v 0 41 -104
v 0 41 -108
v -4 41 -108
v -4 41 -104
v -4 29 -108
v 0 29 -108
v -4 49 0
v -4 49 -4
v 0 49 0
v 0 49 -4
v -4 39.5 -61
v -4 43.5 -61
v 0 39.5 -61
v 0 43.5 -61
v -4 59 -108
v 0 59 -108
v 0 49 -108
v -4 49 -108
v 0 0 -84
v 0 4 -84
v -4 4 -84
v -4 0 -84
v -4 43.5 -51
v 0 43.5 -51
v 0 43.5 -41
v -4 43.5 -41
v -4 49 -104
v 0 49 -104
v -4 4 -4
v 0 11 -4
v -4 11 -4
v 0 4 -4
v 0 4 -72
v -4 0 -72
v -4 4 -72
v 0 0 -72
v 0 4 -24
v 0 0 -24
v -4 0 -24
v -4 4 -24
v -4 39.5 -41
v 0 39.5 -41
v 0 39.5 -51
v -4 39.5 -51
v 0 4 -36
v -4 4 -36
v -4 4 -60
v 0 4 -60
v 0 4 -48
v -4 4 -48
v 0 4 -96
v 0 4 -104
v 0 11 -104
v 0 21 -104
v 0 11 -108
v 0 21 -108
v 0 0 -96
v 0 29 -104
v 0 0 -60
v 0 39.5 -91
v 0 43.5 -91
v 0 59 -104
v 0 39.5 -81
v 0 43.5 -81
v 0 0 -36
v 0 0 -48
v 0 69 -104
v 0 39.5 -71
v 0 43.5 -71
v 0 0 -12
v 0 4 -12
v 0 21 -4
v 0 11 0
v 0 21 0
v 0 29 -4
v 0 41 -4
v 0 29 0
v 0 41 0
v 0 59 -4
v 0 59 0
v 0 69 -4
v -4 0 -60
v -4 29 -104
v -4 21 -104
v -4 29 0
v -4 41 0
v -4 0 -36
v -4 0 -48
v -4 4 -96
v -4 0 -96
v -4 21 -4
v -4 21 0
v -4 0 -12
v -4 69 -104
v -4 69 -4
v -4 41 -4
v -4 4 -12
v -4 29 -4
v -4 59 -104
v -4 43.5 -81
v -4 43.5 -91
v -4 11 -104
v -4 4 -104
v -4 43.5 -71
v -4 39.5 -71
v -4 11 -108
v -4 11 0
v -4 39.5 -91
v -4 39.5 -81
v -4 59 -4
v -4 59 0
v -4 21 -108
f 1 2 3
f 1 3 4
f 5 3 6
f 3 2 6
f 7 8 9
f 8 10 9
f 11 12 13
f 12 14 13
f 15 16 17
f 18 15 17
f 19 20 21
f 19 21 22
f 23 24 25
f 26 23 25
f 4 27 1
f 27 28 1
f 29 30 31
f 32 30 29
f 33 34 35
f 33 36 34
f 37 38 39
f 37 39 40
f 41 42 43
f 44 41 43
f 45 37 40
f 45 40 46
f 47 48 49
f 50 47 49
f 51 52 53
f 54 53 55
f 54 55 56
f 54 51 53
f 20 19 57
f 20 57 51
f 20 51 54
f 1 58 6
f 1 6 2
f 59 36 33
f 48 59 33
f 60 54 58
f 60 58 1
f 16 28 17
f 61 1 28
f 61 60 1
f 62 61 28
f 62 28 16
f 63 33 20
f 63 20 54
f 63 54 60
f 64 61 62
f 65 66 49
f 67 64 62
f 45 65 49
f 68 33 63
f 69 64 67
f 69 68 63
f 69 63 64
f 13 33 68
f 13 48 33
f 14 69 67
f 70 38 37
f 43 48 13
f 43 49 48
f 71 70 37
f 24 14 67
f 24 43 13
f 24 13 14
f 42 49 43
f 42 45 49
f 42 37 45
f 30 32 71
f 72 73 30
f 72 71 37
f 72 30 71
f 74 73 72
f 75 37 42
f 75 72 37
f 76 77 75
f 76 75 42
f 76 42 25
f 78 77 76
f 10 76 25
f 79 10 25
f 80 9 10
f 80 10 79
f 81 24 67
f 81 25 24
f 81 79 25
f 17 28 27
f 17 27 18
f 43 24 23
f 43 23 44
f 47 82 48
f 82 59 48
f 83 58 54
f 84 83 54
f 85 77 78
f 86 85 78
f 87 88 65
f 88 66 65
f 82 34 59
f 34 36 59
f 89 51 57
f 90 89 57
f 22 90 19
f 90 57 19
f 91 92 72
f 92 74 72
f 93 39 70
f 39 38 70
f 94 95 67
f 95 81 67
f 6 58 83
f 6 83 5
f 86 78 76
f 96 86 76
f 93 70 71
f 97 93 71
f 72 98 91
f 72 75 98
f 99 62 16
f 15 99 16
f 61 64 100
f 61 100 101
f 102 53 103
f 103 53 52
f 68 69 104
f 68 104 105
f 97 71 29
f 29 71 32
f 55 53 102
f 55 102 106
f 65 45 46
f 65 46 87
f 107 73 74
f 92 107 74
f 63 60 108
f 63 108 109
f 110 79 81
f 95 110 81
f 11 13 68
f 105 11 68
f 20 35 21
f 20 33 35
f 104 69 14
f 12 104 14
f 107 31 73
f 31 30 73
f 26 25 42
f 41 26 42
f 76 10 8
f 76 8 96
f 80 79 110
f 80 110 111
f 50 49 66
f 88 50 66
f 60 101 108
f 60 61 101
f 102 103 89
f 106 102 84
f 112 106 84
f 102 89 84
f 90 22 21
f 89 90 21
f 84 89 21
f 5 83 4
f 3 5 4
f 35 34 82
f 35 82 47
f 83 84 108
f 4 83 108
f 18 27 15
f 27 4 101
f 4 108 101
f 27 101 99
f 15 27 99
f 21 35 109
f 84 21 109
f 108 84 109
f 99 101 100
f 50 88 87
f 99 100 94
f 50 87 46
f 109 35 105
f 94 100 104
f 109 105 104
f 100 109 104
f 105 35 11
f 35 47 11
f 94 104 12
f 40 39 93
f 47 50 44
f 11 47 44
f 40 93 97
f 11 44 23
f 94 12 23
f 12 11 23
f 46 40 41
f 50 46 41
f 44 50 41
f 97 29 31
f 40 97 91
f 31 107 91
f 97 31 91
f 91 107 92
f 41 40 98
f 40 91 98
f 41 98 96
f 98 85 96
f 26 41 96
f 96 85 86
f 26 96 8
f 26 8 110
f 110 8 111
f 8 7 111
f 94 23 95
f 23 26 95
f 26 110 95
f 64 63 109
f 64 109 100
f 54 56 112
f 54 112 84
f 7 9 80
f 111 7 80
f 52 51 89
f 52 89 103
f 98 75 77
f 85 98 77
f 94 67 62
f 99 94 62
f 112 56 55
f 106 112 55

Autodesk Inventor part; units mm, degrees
ref_plane "YZ Plane" through (0, 0, 0) normal (1, 0, 0) x (0, 1, 0)
ref_plane "XZ Plane" through (0, 0, 0) normal (0, 1, 0) x (-1, 0, 0)
ref_plane "XY Plane" through (0, 0, 0) normal (0, 0, 1) x (1, 0, 0)
sketch "Sketch1" plane through (0, 0, 0) normal (1, 0, 0) x (0, 1, 0)
  line L0 (0, 0) -> (69, 0)
  line L1 (69, 0) -> (69, -108)
  line L2 (69, -108) -> (0, -108)
  line L3 (0, -108) -> (0, 0)
  dimension "d228" = 69
  dimension "d229" = 108
extrude "Extrusion1" add sketch "Sketch1" against normal blind 4
sketch "Sketch2" plane through (0, 0, 0) normal (1, 0, 0) x (0, 0, -1)
  line L0 (54, 69) -> (54, 0)
  line L1 (108, 0) -> (0, 0) projected
  line L2 (0, 0) -> (0, 69) projected
  line L3 (0, 34.5) -> (108, 34.5)
  line L4 (108, 69) -> (108, 0) projected
  line L5 (0, 0) -> (108, 0)
  line L6 (12, 0) -> (12, 4)
  line L7 (4, 0) -> (12, 0)
  line L8 (4, 59) -> (4, 49)
  line L9 (4, 49) -> (0, 49)
  line L10 (0, 49) -> (0, 41)
  line L11 (0, 41) -> (4, 41)
  line L12 (4, 41) -> (4, 29)
  line L13 (4, 29) -> (0, 29)
  line L14 (0, 29) -> (0, 21)
  line L15 (0, 21) -> (4, 21)
  line L16 (4, 21) -> (4, 11)
  line L17 (4, 11) -> (0, 11)
  line L18 (0, 69) -> (0, 0) projected
  line L19 (108, 0) -> (108, 69)
  line L20 (108, 34.5) -> (0, 34.5)
  line L21 (108, 49) -> (108, 41)
  line L22 (108, 29) -> (108, 21)
  line L23 (108, 69) -> (108, 0)
  line L24 (4, 59) -> (0, 59)
  line L25 (0, 0) -> (108, 0) projected
  line L26 (108, 69) -> (0, 69) projected
  line L27 (108, 0) -> (108, 69)
  line L28 (108, 34.5) -> (0, 34.5)
  line L29 (104, 59) -> (104, 49)
  line L30 (104, 49) -> (108, 49)
  line L31 (108, 49) -> (108, 41)
  line L32 (108, 41) -> (104, 41)
  line L33 (104, 41) -> (104, 29)
  line L34 (104, 29) -> (108, 29)
  line L35 (108, 29) -> (108, 21)
  line L36 (108, 21) -> (104, 21)
  line L37 (104, 21) -> (104, 11)
  line L38 (104, 11) -> (108, 11)
  line L39 (108, 69) -> (108, 0)
  line L40 (0, 34.5) -> (108, 34.5)
  line L41 (104, 59) -> (108, 59)
  line L42 (4, 49) -> (4, 41)
  line L43 (4, 29) -> (4, 21)
  line L44 (4, 59) -> (4, 69)
  line L45 (0, 69) -> (108, 69) projected
  line L46 (104, 69) -> (104, 59)
  line L47 (104, 49) -> (104, 41)
  line L48 (104, 29) -> (104, 21)
  line L49 (12, 0) -> (24, 0)
  line L50 (24, 0) -> (24, 4)
  line L51 (24, 4) -> (36, 4)
  line L52 (36, 4) -> (36, 0)
  line L53 (36, 0) -> (24, 0)
  line L54 (36, 0) -> (48, 0)
  line L55 (60, 0) -> (48, 0)
  line L56 (60, 0) -> (72, 0)
  line L57 (72, 0) -> (72, 4)
  line L58 (72, 4) -> (84, 4)
  line L59 (84, 4) -> (84, 0)
  line L60 (84, 0) -> (72, 0)
  line L61 (12, 4) -> (0, 4)
  line L62 (4, 11) -> (4, 0)
  line L63 (104, 11) -> (104, 0)
  line L64 (106, 0) -> (96, 0)
  line L65 (84, 0) -> (96, 0)
  line L66 (48, 0) -> (60, 0)
  line L67 (60, 0) -> (72, 0)
  line L68 (96, 0) -> (106, 0)
  line L69 (108, 4) -> (108, 11)
  line L70 (60, 0) -> (60, 4)
  line L71 (48, 4) -> (48, 0)
  line L72 (60, 4) -> (48, 4)
  line L73 (96, 4) -> (108, 4)
  line L74 (96, 4) -> (96, 0)
  line L75 (108, 0) -> (108, 69) projected
  line L76 (108, 4) -> (108, 0)
  point P0 (12, 0)
  point P1 (108, 29)
  point P2 (108, 41)
  point P3 (108, 49)
  point P4 (108, 59)
  point P5 (108, 11)
  point P6 (108, 21)
  point P7 (84, 0)
  point P8 (104, 0)
  point P9 (36, 0)
  point P10 (4, 4)
  point P11 (104, 4)
  dimension "d246" = 12
  dimension "d248" = 10
  dimension "d250" = 8
  dimension "d253" = 4
  dimension "d256" = 10
  dimension "d257" = 12
  dimension "d259" = 12
extrude "Extrusion2" cut sketch "Sketch2" against normal blind 4 contours L26 L4 L41 L46 | L44 L24 L2 L26 | L72 L70 L1 L0 | L0 L1 L71 L72 | L11 L2 L9 L42 | L43 L15 L2 L13 | L47 L30 L4 L32 | L34 L4 L36 L48 | L57 L58 L59 L1 | L1 L50 L51 L52 | L62 L61 L2 L17 | L38 L4 L73 L63 | L62 L1 L2 L61 | L61 L6 L1 L62 | L73 L4 L1 L63 | L63 L1 L74 L73
sketch "Sketch3" plane through (0, 0, 0) normal (1, 0, 0) x (0, 0, -1)
  line L0 (41, 39.5) -> (81, 39.5)
  line L1 (81, 39.5) -> (81, 43.5)
  line L2 (81, 43.5) -> (41, 43.5)
  line L3 (41, 43.5) -> (41, 39.5)
  line L4 (48, 4) -> (60, 4) projected
  line L5 (67, 43.5) -> (67, 39.5)
  line L6 (104, 69) -> (4, 69) projected
  line L7 (54, 69) -> (54, 4)
  line L8 (60, 4) -> (48, 4) projected
  line L9 (51, 43.5) -> (51, 39.5)
  line L10 (81, 43.5) -> (91, 43.5)
  line L11 (91, 43.5) -> (91, 39.5)
  line L12 (91, 39.5) -> (81, 39.5)
  line L13 (81, 39.5) -> (81, 43.5)
  line L14 (61, 43.5) -> (61, 39.5)
  line L15 (71, 43.5) -> (71, 39.5)
  point P0 (0, 0)
  dimension "d265" = 35.5
  dimension "d266" = 26
  dimension "d267" = 10
  dimension "d272" = 4
  dimension "d274" = 10
  dimension "d275" = 10
  dimension "d276" = 10
  dimension "d277" = 10
extrude "Extrusion3" cut sketch "Sketch3" against normal blind 4 contours L3 L2 L9 L0 | L14 L2 L5 L0 | L5 L2 L15 L0 | L1 L10 L11 L12
properties part number "Langbektang houder"
